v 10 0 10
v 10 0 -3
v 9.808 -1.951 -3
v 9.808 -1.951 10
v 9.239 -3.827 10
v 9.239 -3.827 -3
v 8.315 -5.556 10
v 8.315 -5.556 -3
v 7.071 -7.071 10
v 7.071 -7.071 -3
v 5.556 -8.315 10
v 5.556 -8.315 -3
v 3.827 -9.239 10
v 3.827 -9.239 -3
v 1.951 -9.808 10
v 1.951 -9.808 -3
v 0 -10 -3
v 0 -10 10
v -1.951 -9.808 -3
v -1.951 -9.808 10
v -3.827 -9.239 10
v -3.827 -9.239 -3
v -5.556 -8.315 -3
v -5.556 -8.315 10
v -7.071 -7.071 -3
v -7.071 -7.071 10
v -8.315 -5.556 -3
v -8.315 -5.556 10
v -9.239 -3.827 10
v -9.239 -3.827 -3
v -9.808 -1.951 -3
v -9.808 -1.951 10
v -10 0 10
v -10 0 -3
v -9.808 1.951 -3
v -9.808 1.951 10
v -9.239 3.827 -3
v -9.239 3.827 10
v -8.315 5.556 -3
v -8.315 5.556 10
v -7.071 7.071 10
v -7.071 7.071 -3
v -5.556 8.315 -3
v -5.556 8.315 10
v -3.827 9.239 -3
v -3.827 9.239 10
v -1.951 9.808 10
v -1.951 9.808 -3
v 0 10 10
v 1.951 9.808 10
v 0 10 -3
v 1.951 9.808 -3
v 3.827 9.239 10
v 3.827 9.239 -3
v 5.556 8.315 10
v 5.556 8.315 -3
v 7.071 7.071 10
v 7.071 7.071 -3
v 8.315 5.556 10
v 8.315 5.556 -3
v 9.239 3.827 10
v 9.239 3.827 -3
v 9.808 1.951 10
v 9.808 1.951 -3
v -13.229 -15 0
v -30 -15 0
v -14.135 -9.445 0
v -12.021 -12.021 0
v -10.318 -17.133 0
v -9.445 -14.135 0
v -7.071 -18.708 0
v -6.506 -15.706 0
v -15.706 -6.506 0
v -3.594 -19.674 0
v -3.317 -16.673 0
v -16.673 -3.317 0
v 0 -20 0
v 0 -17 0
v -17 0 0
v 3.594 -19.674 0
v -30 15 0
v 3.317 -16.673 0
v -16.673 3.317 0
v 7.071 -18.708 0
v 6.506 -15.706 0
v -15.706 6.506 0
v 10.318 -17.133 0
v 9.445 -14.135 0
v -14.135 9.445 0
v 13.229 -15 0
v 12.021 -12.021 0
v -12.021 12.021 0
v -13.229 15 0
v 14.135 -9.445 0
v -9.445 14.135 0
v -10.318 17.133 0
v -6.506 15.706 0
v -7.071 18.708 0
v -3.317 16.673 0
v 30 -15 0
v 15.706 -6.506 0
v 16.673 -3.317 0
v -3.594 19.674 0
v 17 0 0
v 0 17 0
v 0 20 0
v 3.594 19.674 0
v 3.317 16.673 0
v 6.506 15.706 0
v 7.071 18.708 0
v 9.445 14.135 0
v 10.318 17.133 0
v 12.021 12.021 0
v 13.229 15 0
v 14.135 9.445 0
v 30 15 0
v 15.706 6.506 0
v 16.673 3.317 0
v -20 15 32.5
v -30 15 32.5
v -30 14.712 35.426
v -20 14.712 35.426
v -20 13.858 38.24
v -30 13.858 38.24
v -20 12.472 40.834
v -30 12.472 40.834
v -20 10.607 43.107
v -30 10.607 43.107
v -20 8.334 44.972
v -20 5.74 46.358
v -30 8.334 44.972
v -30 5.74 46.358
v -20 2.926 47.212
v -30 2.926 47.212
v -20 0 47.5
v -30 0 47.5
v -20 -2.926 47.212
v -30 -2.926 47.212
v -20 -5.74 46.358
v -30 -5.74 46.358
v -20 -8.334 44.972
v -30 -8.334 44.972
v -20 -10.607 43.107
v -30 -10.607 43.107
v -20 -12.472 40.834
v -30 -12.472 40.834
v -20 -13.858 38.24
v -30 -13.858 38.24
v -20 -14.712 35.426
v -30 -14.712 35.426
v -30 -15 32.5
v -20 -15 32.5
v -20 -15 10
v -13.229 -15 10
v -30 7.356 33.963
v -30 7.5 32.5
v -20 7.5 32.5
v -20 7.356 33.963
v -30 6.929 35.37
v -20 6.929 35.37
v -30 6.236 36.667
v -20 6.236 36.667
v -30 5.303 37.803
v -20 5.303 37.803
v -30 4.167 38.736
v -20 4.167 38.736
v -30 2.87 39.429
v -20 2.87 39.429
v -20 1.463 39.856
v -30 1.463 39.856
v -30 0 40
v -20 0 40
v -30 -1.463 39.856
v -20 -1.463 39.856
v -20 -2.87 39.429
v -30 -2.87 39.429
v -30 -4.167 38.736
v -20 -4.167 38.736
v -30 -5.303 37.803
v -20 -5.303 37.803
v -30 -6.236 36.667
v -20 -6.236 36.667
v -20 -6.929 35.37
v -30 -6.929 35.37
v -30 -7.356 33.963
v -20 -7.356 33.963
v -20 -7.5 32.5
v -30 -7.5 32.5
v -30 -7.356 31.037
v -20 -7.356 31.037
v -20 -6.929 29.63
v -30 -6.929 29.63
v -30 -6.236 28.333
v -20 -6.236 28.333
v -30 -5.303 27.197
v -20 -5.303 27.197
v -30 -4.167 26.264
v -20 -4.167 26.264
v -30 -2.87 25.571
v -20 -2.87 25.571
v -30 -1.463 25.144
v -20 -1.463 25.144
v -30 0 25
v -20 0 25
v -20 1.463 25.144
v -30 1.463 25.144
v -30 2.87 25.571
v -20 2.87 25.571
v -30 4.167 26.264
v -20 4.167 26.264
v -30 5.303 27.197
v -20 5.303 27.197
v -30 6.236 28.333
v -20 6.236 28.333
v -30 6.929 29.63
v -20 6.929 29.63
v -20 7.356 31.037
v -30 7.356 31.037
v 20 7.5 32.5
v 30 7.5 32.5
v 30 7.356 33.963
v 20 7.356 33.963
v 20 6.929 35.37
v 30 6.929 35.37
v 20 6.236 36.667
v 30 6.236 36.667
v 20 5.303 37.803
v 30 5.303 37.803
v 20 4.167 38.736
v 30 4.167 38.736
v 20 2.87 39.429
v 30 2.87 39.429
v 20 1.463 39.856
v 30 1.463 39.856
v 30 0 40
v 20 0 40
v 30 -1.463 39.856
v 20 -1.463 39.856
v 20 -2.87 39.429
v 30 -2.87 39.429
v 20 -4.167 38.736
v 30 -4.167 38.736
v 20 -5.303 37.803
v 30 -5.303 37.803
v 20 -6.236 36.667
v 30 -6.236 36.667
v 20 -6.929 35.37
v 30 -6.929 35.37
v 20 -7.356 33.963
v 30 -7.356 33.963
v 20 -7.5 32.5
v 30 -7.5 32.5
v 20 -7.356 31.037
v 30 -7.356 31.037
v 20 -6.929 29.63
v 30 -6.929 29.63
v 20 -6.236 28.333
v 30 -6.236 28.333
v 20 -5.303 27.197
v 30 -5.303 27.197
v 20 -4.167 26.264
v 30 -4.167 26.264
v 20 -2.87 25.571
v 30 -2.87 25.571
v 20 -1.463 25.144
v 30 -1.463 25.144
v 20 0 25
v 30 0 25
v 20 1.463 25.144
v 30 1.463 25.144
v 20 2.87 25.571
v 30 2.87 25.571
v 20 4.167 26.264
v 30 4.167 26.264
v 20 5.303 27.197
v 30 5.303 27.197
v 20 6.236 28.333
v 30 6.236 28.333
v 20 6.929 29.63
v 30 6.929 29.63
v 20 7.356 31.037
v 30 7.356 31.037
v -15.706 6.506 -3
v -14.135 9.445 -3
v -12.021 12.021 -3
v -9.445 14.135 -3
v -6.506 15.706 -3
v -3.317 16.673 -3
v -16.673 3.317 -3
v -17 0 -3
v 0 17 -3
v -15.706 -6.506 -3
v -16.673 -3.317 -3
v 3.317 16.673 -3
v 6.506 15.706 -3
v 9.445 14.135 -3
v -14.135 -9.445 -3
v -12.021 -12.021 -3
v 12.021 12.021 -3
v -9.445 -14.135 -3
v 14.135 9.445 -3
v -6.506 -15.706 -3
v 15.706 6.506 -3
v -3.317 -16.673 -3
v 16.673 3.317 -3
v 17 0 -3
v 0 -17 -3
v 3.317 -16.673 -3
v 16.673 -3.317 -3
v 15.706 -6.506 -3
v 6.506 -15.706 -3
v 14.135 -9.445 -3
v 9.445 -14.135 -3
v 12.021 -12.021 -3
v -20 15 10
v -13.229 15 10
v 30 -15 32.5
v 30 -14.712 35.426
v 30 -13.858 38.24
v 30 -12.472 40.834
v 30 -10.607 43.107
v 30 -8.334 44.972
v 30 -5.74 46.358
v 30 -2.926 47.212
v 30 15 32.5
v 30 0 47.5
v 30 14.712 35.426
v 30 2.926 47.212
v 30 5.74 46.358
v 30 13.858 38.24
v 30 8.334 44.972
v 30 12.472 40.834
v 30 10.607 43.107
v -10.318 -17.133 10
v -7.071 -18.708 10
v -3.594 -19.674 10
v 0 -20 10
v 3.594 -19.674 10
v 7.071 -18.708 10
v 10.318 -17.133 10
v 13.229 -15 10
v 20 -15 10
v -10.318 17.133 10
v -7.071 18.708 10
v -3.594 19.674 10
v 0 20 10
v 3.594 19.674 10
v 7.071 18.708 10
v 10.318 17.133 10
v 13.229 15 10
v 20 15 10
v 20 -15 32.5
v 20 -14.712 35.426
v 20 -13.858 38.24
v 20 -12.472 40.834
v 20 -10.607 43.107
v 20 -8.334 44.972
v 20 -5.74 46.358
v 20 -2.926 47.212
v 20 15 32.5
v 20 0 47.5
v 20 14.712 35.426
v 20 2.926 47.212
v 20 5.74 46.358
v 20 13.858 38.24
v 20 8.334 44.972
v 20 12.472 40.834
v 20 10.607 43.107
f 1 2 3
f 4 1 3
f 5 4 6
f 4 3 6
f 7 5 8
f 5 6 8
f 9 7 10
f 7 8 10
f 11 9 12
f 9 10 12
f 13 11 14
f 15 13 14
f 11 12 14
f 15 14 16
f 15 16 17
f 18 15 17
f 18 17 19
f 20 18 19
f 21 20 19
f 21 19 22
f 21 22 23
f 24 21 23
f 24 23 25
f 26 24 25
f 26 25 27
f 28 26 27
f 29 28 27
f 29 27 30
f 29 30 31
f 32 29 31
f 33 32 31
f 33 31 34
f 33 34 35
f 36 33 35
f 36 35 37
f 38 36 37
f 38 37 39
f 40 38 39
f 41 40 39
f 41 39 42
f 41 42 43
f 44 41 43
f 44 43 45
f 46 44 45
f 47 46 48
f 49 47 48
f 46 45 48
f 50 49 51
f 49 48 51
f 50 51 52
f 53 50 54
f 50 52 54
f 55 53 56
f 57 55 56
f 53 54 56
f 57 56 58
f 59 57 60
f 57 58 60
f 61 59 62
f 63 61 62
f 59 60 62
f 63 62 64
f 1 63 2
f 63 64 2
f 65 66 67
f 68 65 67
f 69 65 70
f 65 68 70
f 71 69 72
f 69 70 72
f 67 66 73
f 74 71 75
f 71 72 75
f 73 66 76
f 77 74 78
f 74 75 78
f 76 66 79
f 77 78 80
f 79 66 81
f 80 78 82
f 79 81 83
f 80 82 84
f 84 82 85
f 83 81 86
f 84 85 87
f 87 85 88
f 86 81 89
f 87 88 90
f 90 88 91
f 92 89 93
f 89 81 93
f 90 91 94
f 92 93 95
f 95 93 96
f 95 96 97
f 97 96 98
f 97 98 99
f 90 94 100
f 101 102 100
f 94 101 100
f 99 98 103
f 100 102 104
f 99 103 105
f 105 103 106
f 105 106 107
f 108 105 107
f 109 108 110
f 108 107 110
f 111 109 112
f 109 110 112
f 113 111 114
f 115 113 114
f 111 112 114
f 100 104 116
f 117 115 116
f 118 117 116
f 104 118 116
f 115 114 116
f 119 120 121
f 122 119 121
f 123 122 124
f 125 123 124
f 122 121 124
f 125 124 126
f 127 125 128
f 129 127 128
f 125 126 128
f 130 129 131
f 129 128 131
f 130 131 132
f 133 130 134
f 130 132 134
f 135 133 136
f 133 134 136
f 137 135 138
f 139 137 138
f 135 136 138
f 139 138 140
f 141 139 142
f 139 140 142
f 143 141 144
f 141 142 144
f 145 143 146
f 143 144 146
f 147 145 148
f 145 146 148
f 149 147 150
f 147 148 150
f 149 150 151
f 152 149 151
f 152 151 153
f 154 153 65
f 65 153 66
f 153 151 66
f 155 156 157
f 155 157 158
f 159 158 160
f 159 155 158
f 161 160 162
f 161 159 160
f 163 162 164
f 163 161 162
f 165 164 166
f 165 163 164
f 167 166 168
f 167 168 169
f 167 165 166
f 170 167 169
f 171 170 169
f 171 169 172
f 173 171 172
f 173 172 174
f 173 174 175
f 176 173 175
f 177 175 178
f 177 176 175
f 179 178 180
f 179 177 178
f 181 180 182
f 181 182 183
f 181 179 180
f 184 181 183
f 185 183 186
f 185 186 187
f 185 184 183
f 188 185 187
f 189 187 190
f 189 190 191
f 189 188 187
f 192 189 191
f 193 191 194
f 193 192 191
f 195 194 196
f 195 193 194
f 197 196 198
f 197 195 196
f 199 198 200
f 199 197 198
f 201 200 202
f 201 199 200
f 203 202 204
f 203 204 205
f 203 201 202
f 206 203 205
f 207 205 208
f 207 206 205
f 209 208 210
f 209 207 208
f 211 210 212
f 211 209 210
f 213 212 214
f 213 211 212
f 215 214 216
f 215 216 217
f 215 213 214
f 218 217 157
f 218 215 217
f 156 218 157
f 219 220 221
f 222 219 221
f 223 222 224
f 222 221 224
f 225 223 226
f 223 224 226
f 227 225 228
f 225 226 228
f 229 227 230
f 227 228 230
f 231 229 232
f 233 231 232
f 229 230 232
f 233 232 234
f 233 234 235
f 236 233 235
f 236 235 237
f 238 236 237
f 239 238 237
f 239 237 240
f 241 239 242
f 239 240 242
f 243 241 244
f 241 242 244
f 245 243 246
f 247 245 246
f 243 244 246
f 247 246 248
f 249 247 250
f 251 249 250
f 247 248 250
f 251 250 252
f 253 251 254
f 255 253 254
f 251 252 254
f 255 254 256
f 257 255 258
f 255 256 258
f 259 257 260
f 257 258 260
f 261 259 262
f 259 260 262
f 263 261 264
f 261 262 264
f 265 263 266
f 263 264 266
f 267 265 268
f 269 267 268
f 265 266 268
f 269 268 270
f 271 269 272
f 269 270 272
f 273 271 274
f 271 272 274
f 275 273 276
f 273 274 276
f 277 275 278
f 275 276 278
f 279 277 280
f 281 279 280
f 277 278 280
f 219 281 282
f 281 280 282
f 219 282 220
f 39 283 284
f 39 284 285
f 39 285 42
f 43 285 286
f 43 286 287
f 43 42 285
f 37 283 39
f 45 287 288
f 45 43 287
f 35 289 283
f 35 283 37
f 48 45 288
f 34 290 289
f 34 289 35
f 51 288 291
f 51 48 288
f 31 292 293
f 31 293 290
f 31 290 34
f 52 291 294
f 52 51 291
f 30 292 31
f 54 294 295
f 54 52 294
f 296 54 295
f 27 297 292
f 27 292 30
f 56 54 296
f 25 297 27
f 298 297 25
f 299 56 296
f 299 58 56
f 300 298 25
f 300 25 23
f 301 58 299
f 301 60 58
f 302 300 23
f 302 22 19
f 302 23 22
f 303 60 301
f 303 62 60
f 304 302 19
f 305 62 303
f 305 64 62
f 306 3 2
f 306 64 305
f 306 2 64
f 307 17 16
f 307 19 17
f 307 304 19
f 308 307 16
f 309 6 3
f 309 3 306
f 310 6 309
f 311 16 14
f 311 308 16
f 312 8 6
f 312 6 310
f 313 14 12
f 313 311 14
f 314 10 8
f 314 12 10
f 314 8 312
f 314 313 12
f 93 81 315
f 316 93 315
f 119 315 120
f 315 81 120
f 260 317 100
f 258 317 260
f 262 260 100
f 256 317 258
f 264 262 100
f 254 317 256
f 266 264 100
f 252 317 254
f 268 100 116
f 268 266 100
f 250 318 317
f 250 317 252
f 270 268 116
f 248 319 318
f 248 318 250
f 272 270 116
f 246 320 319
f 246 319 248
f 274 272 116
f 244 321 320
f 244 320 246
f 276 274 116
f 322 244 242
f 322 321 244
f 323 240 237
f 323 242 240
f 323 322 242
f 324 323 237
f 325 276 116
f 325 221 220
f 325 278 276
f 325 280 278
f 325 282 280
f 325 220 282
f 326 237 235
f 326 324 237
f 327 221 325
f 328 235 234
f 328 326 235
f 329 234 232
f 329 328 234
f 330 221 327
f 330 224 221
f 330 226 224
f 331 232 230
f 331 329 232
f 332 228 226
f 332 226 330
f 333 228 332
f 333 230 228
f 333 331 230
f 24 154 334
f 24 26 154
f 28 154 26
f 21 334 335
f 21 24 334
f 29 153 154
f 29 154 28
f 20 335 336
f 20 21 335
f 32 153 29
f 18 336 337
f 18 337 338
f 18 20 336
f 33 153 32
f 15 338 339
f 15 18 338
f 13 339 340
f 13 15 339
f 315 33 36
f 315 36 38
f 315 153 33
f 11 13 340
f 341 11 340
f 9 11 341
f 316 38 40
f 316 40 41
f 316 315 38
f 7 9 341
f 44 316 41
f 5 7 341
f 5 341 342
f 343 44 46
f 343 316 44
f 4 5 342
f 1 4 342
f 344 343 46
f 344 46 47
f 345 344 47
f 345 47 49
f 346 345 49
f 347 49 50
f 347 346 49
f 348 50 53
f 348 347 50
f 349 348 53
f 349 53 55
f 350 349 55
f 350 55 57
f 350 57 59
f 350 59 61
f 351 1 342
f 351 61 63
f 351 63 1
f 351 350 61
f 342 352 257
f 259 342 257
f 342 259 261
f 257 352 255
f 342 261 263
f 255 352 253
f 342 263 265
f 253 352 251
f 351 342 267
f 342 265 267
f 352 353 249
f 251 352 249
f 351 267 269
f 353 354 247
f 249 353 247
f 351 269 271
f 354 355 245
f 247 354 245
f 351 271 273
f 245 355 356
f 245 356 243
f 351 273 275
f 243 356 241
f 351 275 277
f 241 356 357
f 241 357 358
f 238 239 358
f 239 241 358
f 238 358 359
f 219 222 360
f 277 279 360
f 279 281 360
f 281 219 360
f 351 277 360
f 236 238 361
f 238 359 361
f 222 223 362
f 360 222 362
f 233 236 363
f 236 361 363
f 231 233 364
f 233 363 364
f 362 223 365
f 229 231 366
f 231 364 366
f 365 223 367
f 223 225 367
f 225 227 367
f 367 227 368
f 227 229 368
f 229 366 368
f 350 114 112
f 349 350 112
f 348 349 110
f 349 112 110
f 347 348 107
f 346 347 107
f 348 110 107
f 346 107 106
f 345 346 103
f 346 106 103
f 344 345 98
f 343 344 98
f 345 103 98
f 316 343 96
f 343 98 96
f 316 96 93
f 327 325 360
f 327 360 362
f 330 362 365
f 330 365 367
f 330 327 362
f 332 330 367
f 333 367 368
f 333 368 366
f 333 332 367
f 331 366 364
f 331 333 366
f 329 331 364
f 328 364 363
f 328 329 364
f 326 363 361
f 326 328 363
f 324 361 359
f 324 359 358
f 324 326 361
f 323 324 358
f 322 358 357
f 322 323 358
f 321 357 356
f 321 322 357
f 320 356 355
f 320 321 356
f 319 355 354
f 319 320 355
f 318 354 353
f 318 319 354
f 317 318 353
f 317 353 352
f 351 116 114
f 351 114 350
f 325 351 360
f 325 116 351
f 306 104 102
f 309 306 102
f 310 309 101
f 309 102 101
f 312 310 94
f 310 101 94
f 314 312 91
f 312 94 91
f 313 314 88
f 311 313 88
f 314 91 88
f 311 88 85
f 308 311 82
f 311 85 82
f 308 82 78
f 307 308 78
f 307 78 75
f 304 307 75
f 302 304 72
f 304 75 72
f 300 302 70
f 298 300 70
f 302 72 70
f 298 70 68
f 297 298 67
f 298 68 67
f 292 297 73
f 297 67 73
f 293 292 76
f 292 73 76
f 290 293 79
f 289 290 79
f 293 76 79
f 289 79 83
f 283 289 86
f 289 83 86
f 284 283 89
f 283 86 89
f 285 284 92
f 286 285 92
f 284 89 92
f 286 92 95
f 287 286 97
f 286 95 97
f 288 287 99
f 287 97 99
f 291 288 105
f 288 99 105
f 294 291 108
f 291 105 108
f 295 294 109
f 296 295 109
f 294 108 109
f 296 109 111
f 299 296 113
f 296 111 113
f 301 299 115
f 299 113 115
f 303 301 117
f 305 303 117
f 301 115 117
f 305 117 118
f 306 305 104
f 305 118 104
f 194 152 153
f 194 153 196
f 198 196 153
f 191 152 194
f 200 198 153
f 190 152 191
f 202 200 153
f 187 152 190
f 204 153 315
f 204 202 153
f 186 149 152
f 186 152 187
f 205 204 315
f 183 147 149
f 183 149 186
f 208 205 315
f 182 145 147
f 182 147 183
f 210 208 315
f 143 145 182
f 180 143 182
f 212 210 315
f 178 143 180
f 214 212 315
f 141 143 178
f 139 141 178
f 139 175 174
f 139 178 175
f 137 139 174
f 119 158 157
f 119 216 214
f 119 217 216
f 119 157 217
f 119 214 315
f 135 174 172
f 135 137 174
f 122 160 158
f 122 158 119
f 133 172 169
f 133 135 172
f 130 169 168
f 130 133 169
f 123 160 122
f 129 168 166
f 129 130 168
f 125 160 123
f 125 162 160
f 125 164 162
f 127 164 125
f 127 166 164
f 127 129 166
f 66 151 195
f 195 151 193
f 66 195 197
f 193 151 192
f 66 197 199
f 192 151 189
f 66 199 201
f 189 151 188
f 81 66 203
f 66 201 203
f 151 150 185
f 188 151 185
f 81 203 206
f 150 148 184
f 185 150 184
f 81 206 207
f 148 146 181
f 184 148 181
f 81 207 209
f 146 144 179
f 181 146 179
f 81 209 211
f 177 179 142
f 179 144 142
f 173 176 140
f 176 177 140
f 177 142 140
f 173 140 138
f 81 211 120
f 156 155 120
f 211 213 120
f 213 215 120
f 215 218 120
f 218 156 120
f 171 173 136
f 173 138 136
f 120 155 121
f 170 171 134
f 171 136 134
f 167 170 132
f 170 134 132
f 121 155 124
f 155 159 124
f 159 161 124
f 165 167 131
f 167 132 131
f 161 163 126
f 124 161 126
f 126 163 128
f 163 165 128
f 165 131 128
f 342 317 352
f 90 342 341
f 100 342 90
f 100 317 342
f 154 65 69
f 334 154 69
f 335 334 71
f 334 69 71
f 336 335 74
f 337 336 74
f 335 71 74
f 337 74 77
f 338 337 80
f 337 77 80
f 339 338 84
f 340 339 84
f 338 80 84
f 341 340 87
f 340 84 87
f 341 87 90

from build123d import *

# Parameters (mm, degrees)
F0_R     = 10
F1_DEPTH = 10
F2_R     = 7.5
F3_DEPTH = 10
F5_R     = 17
F6_DEPTH = 3
F7_R     = 10
F8_DEPTH = 50.501


with BuildPart() as f1:
    # F0 (on Top) → F1 (new body)
    with BuildSketch(Plane.XY):
        with BuildLine():
            Line((-30, -15), (-13.228757, -15))
            ThreePointArc((-13.228757, -15), (0, -20), (13.228757, -15))
            Line((13.228757, -15), (30, -15))
            Line((30, -15), (30, 15))
            Line((30, 15), (13.228757, 15))
            ThreePointArc((13.228757, 15), (0, 20), (-13.228757, 15))
            Line((-13.228757, 15), (-30, 15))
            Line((-30, 15), (-30, -15))
        make_face()
        Circle(F0_R, mode=Mode.SUBTRACT)
    extrude(amount=F1_DEPTH)

    # F2 (on face) → F3 (join)
    with BuildSketch(Plane.YZ.offset(30)):
        with BuildLine():
            Line((-15, 32.5), (-15, 10))
            Line((-15, 10), (15, 10))
            Line((15, 10), (15, 32.5))
            ThreePointArc((15, 32.5), (0, 47.5), (-15, 32.5))
        make_face()
        with Locations((0, 32.5)):
            Circle(F2_R, mode=Mode.SUBTRACT)
    extrude(amount=-F3_DEPTH)

    # F4: F1 across plane


with BuildPart() as f1_1:
    add(f1.part)
    add(f1.part.mirror(Plane.YZ))

    # F5 (on face) → F6 (join)
    with BuildSketch(Plane(origin=(0, 0, 0), x_dir=(1, 0, 0), z_dir=(0, 0, -1))):
        Circle(F5_R)
    extrude(amount=F6_DEPTH)

    # F7 (on face) → F8 (cut, through all)
    with BuildSketch(Plane(origin=(0, 0, -3), x_dir=(1, 0, 0), z_dir=(0, 0, -1))):
        Circle(F7_R)
    extrude(amount=-F8_DEPTH, mode=Mode.SUBTRACT)


solid = f1_1.part
